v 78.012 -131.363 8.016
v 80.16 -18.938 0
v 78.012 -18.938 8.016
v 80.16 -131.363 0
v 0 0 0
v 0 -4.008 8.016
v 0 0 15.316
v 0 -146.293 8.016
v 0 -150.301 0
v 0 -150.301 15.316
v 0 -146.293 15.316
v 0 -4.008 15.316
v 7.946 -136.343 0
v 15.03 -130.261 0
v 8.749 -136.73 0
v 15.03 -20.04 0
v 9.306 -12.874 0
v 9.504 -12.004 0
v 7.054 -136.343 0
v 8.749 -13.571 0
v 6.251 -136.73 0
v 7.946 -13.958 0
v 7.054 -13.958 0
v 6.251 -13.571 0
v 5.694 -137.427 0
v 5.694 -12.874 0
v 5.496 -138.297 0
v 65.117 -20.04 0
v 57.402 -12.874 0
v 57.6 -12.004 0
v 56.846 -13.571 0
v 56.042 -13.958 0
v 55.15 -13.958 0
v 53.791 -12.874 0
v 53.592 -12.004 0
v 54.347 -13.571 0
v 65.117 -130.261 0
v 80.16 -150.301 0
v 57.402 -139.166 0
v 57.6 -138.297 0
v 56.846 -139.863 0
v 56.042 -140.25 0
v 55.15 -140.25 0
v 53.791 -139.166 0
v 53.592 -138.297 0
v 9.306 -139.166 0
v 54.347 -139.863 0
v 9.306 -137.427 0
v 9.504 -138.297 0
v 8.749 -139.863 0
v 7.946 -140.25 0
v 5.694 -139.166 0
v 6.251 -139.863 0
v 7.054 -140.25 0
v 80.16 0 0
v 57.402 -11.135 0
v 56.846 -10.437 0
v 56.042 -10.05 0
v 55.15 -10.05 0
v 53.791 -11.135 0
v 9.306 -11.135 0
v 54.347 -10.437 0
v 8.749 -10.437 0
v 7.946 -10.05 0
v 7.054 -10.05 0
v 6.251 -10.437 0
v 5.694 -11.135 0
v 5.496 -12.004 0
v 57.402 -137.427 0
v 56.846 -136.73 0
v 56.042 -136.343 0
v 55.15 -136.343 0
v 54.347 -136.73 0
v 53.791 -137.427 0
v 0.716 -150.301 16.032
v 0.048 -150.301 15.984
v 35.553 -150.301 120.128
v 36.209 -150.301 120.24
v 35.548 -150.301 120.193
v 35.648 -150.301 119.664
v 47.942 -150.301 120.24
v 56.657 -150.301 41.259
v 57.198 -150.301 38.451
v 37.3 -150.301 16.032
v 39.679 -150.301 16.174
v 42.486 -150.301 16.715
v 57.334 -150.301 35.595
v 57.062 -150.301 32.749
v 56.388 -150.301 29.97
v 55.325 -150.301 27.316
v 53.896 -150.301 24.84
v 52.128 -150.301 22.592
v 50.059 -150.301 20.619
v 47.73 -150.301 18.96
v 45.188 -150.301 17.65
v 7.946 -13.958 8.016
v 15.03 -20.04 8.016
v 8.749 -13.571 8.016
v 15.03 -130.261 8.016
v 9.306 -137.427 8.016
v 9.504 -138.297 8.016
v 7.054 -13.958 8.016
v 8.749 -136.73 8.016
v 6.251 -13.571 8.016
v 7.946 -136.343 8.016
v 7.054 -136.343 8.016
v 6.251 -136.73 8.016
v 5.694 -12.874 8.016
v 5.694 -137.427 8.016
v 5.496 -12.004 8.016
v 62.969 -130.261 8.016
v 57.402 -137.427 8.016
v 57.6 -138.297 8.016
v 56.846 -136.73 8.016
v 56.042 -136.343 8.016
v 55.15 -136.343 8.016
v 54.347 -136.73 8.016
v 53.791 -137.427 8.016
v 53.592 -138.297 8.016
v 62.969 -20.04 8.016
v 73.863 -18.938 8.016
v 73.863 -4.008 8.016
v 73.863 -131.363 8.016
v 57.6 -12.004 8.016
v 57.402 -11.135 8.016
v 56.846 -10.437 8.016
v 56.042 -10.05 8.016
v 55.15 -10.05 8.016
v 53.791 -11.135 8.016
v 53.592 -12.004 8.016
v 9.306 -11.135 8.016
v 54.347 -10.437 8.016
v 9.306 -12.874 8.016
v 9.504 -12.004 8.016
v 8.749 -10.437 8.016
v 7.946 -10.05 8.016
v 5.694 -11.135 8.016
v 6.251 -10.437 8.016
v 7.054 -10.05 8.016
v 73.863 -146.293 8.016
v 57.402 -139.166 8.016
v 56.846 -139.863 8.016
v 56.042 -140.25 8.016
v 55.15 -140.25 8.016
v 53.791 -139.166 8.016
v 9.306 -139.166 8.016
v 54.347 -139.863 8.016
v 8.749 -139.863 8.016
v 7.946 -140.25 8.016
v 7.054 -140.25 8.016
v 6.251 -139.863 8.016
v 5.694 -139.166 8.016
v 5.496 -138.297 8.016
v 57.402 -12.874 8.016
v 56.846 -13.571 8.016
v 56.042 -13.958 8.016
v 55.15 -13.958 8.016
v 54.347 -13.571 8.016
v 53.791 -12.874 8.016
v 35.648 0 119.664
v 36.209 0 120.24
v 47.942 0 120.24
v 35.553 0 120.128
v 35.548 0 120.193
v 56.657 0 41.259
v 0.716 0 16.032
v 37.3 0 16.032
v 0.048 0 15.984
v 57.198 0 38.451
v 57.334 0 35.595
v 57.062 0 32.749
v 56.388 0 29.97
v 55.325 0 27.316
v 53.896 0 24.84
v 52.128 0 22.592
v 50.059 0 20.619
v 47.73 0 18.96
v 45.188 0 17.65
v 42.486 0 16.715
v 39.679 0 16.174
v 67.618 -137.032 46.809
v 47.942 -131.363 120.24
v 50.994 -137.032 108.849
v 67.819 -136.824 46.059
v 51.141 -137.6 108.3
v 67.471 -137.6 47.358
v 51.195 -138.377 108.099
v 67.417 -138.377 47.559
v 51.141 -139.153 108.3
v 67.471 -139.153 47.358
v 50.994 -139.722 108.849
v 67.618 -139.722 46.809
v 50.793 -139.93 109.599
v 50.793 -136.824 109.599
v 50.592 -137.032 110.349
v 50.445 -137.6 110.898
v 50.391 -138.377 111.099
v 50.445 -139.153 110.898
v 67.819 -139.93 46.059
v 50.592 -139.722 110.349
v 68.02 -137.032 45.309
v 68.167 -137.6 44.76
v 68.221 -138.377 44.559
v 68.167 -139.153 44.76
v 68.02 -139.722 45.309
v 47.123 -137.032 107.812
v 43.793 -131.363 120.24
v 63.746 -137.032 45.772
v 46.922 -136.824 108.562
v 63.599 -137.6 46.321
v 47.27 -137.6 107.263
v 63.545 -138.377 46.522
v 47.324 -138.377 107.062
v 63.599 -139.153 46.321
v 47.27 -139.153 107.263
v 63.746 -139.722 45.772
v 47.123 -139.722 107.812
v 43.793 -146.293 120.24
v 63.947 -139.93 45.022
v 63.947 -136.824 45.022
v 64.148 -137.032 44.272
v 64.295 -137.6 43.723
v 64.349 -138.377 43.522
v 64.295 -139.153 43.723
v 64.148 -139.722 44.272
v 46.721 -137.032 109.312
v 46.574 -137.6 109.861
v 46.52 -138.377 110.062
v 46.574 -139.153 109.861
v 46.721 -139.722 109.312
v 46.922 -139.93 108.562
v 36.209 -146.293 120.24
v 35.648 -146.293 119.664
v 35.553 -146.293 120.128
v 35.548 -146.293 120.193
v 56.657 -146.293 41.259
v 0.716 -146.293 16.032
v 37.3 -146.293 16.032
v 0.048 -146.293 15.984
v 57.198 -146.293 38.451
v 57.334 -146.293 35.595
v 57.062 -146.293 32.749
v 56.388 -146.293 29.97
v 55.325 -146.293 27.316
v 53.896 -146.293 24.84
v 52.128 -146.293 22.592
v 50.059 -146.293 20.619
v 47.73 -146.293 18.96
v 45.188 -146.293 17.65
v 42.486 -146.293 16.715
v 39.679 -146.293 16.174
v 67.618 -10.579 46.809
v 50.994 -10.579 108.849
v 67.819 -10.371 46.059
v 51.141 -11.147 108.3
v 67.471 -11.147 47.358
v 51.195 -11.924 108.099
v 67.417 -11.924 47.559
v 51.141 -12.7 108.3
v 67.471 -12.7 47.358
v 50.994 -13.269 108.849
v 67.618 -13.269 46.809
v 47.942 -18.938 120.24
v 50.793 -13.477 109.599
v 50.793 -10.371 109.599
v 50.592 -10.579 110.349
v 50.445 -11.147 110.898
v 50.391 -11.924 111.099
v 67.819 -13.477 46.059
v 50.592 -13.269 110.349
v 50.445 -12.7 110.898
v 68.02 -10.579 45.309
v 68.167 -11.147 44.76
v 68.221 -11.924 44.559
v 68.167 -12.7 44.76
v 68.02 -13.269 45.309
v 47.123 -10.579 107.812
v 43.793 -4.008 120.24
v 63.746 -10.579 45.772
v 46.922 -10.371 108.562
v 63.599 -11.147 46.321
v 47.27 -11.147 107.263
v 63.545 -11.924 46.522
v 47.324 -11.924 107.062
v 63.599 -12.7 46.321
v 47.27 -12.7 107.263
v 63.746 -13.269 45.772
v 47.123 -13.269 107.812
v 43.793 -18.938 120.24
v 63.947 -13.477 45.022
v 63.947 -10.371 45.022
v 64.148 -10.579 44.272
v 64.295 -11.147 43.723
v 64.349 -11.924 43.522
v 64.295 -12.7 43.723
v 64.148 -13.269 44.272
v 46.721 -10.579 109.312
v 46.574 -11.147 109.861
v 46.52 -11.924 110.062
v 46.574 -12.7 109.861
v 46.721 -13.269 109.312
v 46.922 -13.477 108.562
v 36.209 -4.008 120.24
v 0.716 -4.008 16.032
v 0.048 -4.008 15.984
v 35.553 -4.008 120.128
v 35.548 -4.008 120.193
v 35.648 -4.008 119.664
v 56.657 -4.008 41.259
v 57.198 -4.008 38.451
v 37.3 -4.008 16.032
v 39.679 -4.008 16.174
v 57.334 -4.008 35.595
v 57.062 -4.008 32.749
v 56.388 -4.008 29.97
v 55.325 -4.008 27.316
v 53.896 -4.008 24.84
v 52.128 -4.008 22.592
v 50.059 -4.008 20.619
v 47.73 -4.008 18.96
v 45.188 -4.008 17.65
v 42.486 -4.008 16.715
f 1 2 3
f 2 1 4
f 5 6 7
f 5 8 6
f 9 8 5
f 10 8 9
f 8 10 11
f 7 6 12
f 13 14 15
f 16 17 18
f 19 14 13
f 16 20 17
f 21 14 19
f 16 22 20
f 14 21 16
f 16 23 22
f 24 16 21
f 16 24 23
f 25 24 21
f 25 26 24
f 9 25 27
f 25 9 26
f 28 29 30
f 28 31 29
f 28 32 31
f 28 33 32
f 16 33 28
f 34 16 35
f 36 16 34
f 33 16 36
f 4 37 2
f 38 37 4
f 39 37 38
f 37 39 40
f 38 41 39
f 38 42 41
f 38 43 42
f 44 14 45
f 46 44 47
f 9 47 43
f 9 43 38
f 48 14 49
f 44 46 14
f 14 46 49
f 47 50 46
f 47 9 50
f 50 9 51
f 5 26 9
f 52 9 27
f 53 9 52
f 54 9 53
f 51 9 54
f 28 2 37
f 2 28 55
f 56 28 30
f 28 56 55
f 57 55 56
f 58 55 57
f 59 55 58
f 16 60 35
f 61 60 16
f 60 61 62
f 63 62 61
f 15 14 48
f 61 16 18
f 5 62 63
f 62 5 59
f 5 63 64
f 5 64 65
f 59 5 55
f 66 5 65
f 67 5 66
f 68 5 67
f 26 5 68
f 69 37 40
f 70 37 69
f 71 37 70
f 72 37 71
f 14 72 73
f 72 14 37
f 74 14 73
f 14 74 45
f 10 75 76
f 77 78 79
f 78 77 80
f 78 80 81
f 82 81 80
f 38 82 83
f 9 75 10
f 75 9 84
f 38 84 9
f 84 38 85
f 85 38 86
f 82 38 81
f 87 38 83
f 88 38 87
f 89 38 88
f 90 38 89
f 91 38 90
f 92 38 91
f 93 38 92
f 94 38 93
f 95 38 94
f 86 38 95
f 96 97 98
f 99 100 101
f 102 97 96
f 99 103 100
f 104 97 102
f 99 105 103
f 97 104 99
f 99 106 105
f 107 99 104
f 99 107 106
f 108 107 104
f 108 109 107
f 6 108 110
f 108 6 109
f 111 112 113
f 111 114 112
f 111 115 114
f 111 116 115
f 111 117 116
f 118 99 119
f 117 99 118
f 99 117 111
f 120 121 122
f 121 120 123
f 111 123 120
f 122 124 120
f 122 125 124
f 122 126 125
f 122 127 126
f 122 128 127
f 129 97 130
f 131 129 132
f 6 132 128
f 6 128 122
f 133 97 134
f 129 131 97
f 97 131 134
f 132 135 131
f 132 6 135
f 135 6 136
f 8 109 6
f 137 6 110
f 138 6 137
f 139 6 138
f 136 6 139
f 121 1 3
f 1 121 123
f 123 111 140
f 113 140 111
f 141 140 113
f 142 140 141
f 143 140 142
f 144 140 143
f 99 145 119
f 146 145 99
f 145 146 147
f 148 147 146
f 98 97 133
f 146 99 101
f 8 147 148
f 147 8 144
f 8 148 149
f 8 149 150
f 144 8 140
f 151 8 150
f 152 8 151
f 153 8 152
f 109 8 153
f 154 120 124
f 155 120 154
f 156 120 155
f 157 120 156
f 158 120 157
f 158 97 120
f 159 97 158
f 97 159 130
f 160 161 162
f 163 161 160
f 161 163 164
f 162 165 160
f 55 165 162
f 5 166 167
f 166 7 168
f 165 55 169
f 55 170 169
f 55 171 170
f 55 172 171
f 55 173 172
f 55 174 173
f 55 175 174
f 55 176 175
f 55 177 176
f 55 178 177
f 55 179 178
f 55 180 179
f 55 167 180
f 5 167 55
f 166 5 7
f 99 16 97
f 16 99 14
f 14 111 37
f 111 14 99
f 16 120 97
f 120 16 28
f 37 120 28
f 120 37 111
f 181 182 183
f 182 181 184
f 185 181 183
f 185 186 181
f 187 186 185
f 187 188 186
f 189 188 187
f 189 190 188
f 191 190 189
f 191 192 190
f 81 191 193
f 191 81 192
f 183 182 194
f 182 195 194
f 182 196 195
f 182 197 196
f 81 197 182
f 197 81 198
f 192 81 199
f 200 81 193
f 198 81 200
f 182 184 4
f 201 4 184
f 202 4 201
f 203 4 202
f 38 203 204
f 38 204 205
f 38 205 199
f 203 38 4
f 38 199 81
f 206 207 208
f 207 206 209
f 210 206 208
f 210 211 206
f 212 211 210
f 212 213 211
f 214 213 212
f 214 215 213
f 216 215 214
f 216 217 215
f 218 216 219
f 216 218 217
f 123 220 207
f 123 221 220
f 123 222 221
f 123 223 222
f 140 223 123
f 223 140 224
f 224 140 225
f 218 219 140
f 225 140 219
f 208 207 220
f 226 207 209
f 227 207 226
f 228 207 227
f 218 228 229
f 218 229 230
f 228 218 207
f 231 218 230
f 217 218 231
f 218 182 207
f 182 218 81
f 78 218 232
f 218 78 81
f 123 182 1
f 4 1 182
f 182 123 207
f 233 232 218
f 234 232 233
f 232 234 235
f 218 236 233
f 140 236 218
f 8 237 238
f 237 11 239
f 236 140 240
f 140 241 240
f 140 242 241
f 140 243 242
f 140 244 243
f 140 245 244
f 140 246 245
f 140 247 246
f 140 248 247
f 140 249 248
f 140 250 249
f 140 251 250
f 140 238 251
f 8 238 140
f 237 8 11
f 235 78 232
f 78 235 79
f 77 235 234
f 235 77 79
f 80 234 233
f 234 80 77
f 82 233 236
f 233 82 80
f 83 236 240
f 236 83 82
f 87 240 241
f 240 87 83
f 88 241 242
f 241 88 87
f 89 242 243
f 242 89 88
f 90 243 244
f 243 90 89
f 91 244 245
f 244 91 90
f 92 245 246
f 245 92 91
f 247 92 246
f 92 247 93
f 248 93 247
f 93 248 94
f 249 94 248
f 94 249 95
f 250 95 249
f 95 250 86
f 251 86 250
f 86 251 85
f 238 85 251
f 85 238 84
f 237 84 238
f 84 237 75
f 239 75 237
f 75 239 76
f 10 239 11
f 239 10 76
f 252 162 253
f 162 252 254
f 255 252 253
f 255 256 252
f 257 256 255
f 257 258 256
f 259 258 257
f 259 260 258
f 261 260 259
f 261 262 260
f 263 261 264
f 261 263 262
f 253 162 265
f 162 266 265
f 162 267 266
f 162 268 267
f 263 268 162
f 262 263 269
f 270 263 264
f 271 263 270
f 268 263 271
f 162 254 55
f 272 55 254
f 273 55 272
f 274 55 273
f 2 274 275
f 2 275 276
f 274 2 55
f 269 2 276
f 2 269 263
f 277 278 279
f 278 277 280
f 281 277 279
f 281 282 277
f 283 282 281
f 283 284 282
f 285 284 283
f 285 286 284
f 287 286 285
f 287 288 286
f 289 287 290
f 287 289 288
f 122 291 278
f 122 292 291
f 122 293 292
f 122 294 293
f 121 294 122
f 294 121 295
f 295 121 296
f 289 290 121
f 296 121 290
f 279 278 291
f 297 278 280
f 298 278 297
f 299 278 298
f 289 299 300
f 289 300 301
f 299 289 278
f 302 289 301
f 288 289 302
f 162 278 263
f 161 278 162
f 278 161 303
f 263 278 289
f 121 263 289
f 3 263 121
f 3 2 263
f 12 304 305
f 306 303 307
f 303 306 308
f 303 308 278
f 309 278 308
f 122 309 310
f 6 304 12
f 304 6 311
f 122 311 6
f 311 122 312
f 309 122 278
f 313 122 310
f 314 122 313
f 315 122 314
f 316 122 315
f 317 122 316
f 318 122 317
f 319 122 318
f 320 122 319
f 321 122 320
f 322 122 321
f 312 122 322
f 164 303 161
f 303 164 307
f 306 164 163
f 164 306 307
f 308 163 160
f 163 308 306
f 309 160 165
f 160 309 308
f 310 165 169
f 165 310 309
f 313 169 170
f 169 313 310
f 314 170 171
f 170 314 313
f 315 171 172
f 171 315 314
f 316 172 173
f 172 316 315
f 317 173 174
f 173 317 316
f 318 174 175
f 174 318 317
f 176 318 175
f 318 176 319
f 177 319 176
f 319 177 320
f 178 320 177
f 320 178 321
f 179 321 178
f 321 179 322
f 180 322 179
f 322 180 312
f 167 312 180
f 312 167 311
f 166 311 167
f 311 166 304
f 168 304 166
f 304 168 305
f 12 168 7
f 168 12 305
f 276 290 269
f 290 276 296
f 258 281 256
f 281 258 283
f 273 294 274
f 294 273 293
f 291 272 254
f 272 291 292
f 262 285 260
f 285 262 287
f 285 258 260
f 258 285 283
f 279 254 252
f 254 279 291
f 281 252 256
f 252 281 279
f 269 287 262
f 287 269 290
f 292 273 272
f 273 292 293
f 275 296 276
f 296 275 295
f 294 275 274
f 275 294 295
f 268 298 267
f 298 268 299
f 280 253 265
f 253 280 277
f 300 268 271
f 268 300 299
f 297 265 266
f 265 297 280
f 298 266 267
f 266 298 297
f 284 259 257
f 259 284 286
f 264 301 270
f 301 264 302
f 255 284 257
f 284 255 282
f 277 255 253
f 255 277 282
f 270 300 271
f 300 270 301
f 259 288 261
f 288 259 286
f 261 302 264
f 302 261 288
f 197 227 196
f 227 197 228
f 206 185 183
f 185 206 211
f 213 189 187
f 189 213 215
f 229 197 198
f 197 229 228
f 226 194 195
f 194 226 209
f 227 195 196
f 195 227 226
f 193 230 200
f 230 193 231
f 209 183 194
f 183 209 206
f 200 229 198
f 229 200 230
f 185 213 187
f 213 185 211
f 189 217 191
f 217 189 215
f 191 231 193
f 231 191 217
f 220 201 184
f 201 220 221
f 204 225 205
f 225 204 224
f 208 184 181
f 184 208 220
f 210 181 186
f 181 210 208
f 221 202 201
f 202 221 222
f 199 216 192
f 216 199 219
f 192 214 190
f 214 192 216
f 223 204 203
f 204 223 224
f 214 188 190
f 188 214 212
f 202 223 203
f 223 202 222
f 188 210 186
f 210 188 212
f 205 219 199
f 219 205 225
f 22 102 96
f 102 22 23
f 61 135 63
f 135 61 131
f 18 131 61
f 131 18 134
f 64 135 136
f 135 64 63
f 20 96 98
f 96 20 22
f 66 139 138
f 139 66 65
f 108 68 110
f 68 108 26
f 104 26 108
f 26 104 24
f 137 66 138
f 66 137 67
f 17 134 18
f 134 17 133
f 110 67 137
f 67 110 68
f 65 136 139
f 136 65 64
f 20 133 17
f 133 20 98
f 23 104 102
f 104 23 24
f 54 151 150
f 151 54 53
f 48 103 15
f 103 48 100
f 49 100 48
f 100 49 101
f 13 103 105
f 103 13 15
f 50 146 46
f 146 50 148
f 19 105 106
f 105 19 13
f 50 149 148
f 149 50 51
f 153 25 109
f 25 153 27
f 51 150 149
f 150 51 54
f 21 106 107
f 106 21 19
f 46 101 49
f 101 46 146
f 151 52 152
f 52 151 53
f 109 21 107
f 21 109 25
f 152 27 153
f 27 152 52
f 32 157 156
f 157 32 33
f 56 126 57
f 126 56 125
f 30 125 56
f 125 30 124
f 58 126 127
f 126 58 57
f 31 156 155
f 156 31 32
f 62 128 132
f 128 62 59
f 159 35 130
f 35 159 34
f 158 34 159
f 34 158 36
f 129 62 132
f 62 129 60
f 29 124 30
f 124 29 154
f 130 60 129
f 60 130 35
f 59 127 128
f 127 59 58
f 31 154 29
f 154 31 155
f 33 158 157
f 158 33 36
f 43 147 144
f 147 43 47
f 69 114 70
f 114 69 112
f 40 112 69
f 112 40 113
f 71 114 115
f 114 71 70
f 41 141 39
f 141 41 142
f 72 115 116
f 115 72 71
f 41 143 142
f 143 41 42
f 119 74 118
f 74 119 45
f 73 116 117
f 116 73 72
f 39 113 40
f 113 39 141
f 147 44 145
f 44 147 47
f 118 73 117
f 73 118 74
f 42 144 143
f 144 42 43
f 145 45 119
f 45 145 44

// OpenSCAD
//------------------------------------------------------------------
/*

Simple Display Stand for Rasberry Pi 7" Display

Similar to: http://www.thingiverse.com/thing:1021025

But:

1) OpenSCAD
2) Allow the usb power port to be at the bottom (normal display orientation).
3) Allow some mounting holes on the foot.
4) Variable thickness display supports to accomodate various M3 screw lengths.
5) Added webbing for better strength.

*/
//------------------------------------------------------------------
/* [Global] */

base_height = 8;
base_length = 150;
base_width = 80;
base_hole_diameter = 4;

foot_sizex = 15;
foot_sizey = 20;

support_height = 120;
support_thickness1 = 4;
support_thickness2 = 12;
support_hole2edge = 7;
support_web_radius = 20;

display_angle = 15;

/* [Hidden] */
//------------------------------------------------------------------

// scaling
pla_shrink = 1/0.998; //~0.2%
abs_shrink = 1/0.995; //~0.5%
function scale(x) = pla_shrink * x;

// small tweak to avoid differencing artifacts
epsilon = 0.05;

// control the number of facets on cylinders
facet_epsilon = 0.05;
function facets(r) = 180 / acos(1 - (facet_epsilon / r));

// rounded/filleted edges
module inverse() {
  difference() {
    square(1e5, center=true);
    children(0);
  }
}
module rounded(r=1) {
  offset(r=r, $fn=facets(r)) offset(r=-r, $fn=facets(r)) children(0);
}
module filleted(r=1) {
  offset(r=-r, $fn=facets(r)) render() offset(r=r, $fn=facets(r)) children(0);
}

//------------------------------------------------------------------

// 4 x M3 mounting holes on display
mount_hole_w = scale(126.20);
mount_hole_h = scale(65.65);
mount_hole_r = scale(3.1/2);

// derived values
base_h = scale(base_height);
base_w = scale(base_width);
base_l = scale(base_length);
base_hole_r = scale(base_hole_diameter/2);

foot_sx = scale(foot_sizex);
foot_sy = scale(foot_sizey);

support_h = scale(support_height);
support_t1 = scale(support_thickness1);
support_t2 = scale(support_thickness2);
support_h2e = scale(support_hole2edge);
support_wr = scale(support_web_radius);

support_face_w = support_h2e + ((base_l - mount_hole_w) / 2);

//------------------------------------------------------------------

module base_profile_2d() {
  delta = base_h * tan(display_angle);
  points = [
    [0, 0],
    [0, base_h],
    [base_w - delta, base_h],
    [base_w, 0],
  ];
  polygon(points=points, convexity=2);
}

module base_hole_profile_2d() {
  delta = (base_h + (2 * epsilon)) * tan(display_angle);
  points = [
    [foot_sx, -epsilon],
    [foot_sx, base_h + epsilon],
    [base_w - foot_sx - delta, base_h + epsilon],
    [base_w - foot_sx, -epsilon],
  ];
  polygon(points=points, convexity=2);
}

module base() {
  hole_l = base_l - (2 * foot_sy);
  difference() {
    linear_extrude(height=base_l) base_profile_2d();
    translate([0,0,foot_sy]) linear_extrude(height=hole_l) base_hole_profile_2d();
  }
}

//------------------------------------------------------------------

module support_face_2d() {
  delta = support_h * tan(display_angle);
  delta_t = support_t1 / cos(display_angle);
  points = [
    [0, 0],
    [-delta, support_h],
    [-delta + delta_t, support_h],
    [delta_t, 0],
  ];
  polygon(points=points, convexity=2);
}

module support_face() {
  delta_t = support_t1 / cos(display_angle);
  translate([base_w - delta_t,0,0]) linear_extrude(height=support_face_w) support_face_2d();
}

module support_web_2d() {
  delta1 = support_h * tan(display_angle);
  delta2 = support_t2 / cos(display_angle);
  h = base_h + support_t2 - support_t1;
  delta3 = h * tan(display_angle);

  points = [
    [0, 0],
    [0, h],
    [base_w - delta2 - delta3, h],
    [base_w - delta1 - delta2, support_h],
    [base_w - delta1, support_h],
    [base_w, 0],
  ];
  filleted(r=support_wr) polygon(points=points, convexity=2);
}

module support_web() {
  linear_extrude(height=support_t1) support_web_2d();
}

module support_left() {
  translate([0,0,base_l - support_face_w]) support_face();
  translate([0,0,base_l - support_t1])support_web();
}

module support_right() {
  support_face();
  support_web();
}

module support() {
  support_left();
  support_right();
}

//------------------------------------------------------------------

module display_hole() {
  h = support_t1 + (2 * epsilon);
  rotate([0,90,0]) cylinder(h = h, r = mount_hole_r, $fn = facets(mount_hole_r));
}

module display_holes() {

  dx = support_t1 + epsilon;
  dy = support_h - mount_hole_h - (support_h2e * cos(display_angle));
  dz = (base_l - mount_hole_w) / 2;

  translate([base_w,0,0]) rotate([0,0,display_angle]) translate([-dx,dy,dz]) union() {
    dx = mount_hole_w;
    dy = mount_hole_h;
    display_hole();
    translate([0,dy,0]) display_hole();
    translate([0,dy,dx]) display_hole();
    translate([0,0,dx]) display_hole();
  }
}

module base_hole() {
  h = base_h + (2 * epsilon);
  translate([0,-epsilon,0]) rotate([-90,0,0]) cylinder(h = h, r = base_hole_r, $fn = facets(base_hole_r));
}

module base_holes() {
  union() {
    z0 = (foot_sizey + support_t1) / 2;
    z1 = base_l - z0;
    x0 = foot_sizex / 2;
    x1 = x0 + (0.6 * base_w);
    translate([x0,0,z0]) base_hole();
    translate([x0,0,z1]) base_hole();
    translate([x1,0,z0]) base_hole();
    translate([x1,0,z1]) base_hole();
  }
}

module holes() {
  display_holes();
  base_holes();
}

//------------------------------------------------------------------

module display_stand() {
  difference() {
    union() {
      base();
      support();
    }
    holes();
  }
}

rotate([90,0,0]) display_stand();

//------------------------------------------------------------------
